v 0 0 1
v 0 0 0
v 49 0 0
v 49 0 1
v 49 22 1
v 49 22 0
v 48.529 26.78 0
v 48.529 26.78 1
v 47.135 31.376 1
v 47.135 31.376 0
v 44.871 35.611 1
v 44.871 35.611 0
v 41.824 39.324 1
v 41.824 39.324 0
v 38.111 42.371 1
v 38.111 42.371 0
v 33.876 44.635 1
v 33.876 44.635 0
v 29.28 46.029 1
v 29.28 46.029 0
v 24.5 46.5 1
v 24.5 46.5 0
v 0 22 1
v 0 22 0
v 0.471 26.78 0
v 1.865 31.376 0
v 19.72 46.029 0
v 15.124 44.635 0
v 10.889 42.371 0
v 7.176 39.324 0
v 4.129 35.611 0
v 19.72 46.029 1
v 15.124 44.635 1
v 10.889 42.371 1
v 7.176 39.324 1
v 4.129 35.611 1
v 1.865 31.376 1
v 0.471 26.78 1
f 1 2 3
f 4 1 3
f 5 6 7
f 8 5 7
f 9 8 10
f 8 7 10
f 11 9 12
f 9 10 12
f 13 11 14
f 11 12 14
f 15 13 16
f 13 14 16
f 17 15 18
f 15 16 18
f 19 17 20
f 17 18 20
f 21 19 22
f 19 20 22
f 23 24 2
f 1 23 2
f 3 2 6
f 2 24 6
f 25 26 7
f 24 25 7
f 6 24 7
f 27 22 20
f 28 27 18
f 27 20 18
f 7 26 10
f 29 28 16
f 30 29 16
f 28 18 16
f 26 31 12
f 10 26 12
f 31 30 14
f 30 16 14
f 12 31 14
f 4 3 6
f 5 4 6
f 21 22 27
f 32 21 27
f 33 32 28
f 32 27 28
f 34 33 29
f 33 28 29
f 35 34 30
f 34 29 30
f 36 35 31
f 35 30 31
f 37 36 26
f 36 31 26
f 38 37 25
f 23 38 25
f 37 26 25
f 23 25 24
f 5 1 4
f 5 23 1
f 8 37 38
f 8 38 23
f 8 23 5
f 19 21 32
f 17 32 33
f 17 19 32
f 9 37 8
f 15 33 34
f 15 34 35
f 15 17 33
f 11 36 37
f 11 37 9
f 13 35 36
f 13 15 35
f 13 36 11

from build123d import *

# Parameters (mm, degrees)
BOSS_EXTRU_1_DEPTH = 1


with BuildPart() as part:
    # Esquisse1 → Boss.-Extru.1 (new body)
    with BuildSketch(Plane.XY):
        with BuildLine():
            Line((0, 0), (49, 0))
            Line((49, 0), (49, 22))
            ThreePointArc((49, 22), (41.824116139, 39.324116139), (24.5, 46.5))
            ThreePointArc((24.5, 46.5), (7.175883861, 39.324116139), (0, 22))
            Line((0, 22), (0, 0))
        make_face()
    extrude(amount=BOSS_EXTRU_1_DEPTH)


solid = part.part
